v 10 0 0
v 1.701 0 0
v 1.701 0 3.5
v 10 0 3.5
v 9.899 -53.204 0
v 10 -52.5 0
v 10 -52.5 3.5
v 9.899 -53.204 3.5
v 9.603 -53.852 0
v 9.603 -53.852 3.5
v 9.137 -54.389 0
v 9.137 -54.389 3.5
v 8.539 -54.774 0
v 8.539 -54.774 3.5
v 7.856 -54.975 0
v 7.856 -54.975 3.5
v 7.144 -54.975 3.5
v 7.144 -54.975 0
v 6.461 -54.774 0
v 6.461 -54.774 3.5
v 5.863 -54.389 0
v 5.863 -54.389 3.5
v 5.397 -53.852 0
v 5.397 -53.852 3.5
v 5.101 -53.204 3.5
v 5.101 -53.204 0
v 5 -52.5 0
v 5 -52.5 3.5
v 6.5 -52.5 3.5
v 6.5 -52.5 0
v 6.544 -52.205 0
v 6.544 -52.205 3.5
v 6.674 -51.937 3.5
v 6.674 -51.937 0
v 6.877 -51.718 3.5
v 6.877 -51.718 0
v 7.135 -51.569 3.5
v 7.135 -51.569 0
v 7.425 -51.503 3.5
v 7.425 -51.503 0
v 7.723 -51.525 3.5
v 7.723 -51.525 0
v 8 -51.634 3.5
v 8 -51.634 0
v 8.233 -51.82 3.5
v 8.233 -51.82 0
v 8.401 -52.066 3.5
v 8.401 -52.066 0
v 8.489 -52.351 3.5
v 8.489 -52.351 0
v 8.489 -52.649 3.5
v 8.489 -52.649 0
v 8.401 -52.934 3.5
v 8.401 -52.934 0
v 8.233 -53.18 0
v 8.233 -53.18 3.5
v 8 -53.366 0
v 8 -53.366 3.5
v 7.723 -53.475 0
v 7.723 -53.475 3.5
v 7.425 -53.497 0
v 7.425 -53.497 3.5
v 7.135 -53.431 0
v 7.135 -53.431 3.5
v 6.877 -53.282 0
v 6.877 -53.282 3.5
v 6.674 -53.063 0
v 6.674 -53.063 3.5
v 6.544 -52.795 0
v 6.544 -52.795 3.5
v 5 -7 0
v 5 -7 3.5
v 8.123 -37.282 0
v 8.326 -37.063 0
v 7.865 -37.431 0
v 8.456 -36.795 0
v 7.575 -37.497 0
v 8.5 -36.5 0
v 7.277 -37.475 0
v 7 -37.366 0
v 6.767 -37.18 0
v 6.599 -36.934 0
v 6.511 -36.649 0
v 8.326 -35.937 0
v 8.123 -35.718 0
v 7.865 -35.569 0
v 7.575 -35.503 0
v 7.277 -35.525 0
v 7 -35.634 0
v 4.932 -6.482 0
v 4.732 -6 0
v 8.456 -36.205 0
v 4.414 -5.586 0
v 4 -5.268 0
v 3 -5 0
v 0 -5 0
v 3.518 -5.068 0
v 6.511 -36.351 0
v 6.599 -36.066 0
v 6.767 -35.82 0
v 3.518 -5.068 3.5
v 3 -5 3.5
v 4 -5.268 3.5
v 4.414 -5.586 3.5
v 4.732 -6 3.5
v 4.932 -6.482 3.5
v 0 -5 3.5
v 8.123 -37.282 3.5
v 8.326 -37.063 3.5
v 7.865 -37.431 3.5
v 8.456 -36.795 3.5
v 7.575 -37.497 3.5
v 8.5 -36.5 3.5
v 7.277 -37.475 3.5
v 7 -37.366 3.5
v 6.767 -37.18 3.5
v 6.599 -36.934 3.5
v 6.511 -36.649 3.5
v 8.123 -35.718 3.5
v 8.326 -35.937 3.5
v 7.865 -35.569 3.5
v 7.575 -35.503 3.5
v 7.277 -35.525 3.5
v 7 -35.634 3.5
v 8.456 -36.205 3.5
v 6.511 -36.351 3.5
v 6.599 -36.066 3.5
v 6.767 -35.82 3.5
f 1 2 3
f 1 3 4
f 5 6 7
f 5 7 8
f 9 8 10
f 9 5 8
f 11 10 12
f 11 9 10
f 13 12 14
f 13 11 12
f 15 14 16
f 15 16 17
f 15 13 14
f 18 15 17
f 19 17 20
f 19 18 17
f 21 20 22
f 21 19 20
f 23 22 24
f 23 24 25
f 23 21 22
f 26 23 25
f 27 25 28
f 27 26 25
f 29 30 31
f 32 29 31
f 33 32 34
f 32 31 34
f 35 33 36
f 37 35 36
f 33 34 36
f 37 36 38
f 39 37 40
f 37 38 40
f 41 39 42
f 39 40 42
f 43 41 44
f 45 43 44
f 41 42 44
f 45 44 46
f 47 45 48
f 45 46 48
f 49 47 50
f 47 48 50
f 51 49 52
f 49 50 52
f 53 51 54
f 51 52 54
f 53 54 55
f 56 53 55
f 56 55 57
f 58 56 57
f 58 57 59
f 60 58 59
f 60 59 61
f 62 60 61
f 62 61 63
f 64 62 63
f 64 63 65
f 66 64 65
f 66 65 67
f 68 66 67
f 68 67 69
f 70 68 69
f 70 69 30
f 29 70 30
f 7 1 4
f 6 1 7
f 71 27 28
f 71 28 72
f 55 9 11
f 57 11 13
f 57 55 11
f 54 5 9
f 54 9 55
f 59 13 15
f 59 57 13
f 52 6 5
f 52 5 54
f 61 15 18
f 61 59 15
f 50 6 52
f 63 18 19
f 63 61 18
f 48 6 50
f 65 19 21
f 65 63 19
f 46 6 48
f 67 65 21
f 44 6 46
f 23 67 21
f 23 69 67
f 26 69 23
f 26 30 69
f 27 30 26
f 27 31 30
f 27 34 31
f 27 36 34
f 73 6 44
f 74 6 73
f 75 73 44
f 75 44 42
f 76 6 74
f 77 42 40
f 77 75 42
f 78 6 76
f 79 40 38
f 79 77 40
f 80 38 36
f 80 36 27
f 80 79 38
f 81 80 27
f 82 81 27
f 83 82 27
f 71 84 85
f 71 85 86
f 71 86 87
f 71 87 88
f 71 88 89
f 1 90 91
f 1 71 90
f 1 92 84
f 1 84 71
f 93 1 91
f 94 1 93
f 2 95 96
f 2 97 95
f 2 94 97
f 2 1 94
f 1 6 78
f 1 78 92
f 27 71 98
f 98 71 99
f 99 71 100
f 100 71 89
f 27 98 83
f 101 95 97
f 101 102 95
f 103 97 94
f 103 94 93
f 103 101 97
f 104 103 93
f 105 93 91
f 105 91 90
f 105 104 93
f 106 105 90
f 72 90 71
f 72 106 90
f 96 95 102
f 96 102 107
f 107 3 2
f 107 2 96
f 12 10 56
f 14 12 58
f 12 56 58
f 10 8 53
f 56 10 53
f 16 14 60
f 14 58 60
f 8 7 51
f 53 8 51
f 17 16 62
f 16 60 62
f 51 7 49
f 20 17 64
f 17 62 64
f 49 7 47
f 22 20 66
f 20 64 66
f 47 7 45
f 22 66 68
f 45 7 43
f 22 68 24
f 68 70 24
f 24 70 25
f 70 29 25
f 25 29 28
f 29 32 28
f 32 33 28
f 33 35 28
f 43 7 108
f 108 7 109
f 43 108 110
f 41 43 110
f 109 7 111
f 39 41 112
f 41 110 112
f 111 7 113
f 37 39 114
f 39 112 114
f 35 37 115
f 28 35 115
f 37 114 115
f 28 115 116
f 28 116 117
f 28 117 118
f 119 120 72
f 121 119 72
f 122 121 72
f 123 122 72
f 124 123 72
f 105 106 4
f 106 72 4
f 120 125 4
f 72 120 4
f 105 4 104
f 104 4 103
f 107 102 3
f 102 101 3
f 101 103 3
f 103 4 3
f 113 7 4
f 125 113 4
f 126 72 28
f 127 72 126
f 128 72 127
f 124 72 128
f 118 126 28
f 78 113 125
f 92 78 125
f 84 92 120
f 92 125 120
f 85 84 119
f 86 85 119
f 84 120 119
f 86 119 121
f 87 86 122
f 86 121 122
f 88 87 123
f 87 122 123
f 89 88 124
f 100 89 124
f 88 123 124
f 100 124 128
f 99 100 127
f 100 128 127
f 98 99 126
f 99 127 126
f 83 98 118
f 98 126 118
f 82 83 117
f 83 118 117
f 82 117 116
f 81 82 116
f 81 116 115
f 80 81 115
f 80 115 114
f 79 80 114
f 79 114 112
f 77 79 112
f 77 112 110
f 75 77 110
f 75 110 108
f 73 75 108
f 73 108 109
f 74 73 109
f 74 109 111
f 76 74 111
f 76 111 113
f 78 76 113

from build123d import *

# Parameters (mm, degrees)
BOSS_EXTRU_1_DEPTH      = 3.5
ESQUISSE3_R             = 1
ENL_V_MAT_EXTRU_1_DEPTH = 4
ESQUISSE4_R             = 1
ENL_V_MAT_EXTRU_2_DEPTH = 10
ENL_V_MAT_EXTRU_3_DEPTH = 57.011159602
CONG_1_R                = 2


with BuildPart() as part:
    # Esquisse1 → Boss.-Extru.1 (new body)
    with BuildSketch(Plane.XY):
        with BuildLine():
            Line((0, 0), (10, 0))
            Line((10, 0), (10, -52.5))
            ThreePointArc((10, -52.5), (7.5, -55), (5, -52.5))
            Line((5, -52.5), (5, -5))
            Line((5, -5), (0, -5))
            Line((0, -5), (0, 0))
        make_face()
    extrude(amount=BOSS_EXTRU_1_DEPTH)

    # Esquisse3 → Enlèv. mat.-Extru.1 (cut)
    with BuildSketch(Plane(origin=(0, 0, 0), x_dir=(-1, 0, 0), z_dir=(0, 0, -1))):
        with Locations((-7.5, -52.5)):
            Circle(ESQUISSE3_R)
    extrude(amount=-ENL_V_MAT_EXTRU_1_DEPTH, mode=Mode.SUBTRACT)

    # Esquisse4 → Enlèv. mat.-Extru.2 (cut)
    with BuildSketch(Plane.XY.offset(3.5)):
        with Locations((7.5, -36.5)):
            Circle(ESQUISSE4_R)
    extrude(amount=-ENL_V_MAT_EXTRU_2_DEPTH, mode=Mode.SUBTRACT)

    # Esquisse5 → Enlèv. mat.-Extru.3 (cut, through all)
    with BuildSketch(Plane.XY.offset(3.5)):
        Polygon((0, 0), (1.700931961, 0), (0, -5), align=None)
    extrude(amount=-ENL_V_MAT_EXTRU_3_DEPTH, mode=Mode.SUBTRACT)

    # Congé1
    cong_1_edges = [part.edges().sort_by_distance(p)[0] for p in [
        (5, -5, 1.75),
    ]]
    fillet(cong_1_edges, radius=CONG_1_R)


solid = part.part
